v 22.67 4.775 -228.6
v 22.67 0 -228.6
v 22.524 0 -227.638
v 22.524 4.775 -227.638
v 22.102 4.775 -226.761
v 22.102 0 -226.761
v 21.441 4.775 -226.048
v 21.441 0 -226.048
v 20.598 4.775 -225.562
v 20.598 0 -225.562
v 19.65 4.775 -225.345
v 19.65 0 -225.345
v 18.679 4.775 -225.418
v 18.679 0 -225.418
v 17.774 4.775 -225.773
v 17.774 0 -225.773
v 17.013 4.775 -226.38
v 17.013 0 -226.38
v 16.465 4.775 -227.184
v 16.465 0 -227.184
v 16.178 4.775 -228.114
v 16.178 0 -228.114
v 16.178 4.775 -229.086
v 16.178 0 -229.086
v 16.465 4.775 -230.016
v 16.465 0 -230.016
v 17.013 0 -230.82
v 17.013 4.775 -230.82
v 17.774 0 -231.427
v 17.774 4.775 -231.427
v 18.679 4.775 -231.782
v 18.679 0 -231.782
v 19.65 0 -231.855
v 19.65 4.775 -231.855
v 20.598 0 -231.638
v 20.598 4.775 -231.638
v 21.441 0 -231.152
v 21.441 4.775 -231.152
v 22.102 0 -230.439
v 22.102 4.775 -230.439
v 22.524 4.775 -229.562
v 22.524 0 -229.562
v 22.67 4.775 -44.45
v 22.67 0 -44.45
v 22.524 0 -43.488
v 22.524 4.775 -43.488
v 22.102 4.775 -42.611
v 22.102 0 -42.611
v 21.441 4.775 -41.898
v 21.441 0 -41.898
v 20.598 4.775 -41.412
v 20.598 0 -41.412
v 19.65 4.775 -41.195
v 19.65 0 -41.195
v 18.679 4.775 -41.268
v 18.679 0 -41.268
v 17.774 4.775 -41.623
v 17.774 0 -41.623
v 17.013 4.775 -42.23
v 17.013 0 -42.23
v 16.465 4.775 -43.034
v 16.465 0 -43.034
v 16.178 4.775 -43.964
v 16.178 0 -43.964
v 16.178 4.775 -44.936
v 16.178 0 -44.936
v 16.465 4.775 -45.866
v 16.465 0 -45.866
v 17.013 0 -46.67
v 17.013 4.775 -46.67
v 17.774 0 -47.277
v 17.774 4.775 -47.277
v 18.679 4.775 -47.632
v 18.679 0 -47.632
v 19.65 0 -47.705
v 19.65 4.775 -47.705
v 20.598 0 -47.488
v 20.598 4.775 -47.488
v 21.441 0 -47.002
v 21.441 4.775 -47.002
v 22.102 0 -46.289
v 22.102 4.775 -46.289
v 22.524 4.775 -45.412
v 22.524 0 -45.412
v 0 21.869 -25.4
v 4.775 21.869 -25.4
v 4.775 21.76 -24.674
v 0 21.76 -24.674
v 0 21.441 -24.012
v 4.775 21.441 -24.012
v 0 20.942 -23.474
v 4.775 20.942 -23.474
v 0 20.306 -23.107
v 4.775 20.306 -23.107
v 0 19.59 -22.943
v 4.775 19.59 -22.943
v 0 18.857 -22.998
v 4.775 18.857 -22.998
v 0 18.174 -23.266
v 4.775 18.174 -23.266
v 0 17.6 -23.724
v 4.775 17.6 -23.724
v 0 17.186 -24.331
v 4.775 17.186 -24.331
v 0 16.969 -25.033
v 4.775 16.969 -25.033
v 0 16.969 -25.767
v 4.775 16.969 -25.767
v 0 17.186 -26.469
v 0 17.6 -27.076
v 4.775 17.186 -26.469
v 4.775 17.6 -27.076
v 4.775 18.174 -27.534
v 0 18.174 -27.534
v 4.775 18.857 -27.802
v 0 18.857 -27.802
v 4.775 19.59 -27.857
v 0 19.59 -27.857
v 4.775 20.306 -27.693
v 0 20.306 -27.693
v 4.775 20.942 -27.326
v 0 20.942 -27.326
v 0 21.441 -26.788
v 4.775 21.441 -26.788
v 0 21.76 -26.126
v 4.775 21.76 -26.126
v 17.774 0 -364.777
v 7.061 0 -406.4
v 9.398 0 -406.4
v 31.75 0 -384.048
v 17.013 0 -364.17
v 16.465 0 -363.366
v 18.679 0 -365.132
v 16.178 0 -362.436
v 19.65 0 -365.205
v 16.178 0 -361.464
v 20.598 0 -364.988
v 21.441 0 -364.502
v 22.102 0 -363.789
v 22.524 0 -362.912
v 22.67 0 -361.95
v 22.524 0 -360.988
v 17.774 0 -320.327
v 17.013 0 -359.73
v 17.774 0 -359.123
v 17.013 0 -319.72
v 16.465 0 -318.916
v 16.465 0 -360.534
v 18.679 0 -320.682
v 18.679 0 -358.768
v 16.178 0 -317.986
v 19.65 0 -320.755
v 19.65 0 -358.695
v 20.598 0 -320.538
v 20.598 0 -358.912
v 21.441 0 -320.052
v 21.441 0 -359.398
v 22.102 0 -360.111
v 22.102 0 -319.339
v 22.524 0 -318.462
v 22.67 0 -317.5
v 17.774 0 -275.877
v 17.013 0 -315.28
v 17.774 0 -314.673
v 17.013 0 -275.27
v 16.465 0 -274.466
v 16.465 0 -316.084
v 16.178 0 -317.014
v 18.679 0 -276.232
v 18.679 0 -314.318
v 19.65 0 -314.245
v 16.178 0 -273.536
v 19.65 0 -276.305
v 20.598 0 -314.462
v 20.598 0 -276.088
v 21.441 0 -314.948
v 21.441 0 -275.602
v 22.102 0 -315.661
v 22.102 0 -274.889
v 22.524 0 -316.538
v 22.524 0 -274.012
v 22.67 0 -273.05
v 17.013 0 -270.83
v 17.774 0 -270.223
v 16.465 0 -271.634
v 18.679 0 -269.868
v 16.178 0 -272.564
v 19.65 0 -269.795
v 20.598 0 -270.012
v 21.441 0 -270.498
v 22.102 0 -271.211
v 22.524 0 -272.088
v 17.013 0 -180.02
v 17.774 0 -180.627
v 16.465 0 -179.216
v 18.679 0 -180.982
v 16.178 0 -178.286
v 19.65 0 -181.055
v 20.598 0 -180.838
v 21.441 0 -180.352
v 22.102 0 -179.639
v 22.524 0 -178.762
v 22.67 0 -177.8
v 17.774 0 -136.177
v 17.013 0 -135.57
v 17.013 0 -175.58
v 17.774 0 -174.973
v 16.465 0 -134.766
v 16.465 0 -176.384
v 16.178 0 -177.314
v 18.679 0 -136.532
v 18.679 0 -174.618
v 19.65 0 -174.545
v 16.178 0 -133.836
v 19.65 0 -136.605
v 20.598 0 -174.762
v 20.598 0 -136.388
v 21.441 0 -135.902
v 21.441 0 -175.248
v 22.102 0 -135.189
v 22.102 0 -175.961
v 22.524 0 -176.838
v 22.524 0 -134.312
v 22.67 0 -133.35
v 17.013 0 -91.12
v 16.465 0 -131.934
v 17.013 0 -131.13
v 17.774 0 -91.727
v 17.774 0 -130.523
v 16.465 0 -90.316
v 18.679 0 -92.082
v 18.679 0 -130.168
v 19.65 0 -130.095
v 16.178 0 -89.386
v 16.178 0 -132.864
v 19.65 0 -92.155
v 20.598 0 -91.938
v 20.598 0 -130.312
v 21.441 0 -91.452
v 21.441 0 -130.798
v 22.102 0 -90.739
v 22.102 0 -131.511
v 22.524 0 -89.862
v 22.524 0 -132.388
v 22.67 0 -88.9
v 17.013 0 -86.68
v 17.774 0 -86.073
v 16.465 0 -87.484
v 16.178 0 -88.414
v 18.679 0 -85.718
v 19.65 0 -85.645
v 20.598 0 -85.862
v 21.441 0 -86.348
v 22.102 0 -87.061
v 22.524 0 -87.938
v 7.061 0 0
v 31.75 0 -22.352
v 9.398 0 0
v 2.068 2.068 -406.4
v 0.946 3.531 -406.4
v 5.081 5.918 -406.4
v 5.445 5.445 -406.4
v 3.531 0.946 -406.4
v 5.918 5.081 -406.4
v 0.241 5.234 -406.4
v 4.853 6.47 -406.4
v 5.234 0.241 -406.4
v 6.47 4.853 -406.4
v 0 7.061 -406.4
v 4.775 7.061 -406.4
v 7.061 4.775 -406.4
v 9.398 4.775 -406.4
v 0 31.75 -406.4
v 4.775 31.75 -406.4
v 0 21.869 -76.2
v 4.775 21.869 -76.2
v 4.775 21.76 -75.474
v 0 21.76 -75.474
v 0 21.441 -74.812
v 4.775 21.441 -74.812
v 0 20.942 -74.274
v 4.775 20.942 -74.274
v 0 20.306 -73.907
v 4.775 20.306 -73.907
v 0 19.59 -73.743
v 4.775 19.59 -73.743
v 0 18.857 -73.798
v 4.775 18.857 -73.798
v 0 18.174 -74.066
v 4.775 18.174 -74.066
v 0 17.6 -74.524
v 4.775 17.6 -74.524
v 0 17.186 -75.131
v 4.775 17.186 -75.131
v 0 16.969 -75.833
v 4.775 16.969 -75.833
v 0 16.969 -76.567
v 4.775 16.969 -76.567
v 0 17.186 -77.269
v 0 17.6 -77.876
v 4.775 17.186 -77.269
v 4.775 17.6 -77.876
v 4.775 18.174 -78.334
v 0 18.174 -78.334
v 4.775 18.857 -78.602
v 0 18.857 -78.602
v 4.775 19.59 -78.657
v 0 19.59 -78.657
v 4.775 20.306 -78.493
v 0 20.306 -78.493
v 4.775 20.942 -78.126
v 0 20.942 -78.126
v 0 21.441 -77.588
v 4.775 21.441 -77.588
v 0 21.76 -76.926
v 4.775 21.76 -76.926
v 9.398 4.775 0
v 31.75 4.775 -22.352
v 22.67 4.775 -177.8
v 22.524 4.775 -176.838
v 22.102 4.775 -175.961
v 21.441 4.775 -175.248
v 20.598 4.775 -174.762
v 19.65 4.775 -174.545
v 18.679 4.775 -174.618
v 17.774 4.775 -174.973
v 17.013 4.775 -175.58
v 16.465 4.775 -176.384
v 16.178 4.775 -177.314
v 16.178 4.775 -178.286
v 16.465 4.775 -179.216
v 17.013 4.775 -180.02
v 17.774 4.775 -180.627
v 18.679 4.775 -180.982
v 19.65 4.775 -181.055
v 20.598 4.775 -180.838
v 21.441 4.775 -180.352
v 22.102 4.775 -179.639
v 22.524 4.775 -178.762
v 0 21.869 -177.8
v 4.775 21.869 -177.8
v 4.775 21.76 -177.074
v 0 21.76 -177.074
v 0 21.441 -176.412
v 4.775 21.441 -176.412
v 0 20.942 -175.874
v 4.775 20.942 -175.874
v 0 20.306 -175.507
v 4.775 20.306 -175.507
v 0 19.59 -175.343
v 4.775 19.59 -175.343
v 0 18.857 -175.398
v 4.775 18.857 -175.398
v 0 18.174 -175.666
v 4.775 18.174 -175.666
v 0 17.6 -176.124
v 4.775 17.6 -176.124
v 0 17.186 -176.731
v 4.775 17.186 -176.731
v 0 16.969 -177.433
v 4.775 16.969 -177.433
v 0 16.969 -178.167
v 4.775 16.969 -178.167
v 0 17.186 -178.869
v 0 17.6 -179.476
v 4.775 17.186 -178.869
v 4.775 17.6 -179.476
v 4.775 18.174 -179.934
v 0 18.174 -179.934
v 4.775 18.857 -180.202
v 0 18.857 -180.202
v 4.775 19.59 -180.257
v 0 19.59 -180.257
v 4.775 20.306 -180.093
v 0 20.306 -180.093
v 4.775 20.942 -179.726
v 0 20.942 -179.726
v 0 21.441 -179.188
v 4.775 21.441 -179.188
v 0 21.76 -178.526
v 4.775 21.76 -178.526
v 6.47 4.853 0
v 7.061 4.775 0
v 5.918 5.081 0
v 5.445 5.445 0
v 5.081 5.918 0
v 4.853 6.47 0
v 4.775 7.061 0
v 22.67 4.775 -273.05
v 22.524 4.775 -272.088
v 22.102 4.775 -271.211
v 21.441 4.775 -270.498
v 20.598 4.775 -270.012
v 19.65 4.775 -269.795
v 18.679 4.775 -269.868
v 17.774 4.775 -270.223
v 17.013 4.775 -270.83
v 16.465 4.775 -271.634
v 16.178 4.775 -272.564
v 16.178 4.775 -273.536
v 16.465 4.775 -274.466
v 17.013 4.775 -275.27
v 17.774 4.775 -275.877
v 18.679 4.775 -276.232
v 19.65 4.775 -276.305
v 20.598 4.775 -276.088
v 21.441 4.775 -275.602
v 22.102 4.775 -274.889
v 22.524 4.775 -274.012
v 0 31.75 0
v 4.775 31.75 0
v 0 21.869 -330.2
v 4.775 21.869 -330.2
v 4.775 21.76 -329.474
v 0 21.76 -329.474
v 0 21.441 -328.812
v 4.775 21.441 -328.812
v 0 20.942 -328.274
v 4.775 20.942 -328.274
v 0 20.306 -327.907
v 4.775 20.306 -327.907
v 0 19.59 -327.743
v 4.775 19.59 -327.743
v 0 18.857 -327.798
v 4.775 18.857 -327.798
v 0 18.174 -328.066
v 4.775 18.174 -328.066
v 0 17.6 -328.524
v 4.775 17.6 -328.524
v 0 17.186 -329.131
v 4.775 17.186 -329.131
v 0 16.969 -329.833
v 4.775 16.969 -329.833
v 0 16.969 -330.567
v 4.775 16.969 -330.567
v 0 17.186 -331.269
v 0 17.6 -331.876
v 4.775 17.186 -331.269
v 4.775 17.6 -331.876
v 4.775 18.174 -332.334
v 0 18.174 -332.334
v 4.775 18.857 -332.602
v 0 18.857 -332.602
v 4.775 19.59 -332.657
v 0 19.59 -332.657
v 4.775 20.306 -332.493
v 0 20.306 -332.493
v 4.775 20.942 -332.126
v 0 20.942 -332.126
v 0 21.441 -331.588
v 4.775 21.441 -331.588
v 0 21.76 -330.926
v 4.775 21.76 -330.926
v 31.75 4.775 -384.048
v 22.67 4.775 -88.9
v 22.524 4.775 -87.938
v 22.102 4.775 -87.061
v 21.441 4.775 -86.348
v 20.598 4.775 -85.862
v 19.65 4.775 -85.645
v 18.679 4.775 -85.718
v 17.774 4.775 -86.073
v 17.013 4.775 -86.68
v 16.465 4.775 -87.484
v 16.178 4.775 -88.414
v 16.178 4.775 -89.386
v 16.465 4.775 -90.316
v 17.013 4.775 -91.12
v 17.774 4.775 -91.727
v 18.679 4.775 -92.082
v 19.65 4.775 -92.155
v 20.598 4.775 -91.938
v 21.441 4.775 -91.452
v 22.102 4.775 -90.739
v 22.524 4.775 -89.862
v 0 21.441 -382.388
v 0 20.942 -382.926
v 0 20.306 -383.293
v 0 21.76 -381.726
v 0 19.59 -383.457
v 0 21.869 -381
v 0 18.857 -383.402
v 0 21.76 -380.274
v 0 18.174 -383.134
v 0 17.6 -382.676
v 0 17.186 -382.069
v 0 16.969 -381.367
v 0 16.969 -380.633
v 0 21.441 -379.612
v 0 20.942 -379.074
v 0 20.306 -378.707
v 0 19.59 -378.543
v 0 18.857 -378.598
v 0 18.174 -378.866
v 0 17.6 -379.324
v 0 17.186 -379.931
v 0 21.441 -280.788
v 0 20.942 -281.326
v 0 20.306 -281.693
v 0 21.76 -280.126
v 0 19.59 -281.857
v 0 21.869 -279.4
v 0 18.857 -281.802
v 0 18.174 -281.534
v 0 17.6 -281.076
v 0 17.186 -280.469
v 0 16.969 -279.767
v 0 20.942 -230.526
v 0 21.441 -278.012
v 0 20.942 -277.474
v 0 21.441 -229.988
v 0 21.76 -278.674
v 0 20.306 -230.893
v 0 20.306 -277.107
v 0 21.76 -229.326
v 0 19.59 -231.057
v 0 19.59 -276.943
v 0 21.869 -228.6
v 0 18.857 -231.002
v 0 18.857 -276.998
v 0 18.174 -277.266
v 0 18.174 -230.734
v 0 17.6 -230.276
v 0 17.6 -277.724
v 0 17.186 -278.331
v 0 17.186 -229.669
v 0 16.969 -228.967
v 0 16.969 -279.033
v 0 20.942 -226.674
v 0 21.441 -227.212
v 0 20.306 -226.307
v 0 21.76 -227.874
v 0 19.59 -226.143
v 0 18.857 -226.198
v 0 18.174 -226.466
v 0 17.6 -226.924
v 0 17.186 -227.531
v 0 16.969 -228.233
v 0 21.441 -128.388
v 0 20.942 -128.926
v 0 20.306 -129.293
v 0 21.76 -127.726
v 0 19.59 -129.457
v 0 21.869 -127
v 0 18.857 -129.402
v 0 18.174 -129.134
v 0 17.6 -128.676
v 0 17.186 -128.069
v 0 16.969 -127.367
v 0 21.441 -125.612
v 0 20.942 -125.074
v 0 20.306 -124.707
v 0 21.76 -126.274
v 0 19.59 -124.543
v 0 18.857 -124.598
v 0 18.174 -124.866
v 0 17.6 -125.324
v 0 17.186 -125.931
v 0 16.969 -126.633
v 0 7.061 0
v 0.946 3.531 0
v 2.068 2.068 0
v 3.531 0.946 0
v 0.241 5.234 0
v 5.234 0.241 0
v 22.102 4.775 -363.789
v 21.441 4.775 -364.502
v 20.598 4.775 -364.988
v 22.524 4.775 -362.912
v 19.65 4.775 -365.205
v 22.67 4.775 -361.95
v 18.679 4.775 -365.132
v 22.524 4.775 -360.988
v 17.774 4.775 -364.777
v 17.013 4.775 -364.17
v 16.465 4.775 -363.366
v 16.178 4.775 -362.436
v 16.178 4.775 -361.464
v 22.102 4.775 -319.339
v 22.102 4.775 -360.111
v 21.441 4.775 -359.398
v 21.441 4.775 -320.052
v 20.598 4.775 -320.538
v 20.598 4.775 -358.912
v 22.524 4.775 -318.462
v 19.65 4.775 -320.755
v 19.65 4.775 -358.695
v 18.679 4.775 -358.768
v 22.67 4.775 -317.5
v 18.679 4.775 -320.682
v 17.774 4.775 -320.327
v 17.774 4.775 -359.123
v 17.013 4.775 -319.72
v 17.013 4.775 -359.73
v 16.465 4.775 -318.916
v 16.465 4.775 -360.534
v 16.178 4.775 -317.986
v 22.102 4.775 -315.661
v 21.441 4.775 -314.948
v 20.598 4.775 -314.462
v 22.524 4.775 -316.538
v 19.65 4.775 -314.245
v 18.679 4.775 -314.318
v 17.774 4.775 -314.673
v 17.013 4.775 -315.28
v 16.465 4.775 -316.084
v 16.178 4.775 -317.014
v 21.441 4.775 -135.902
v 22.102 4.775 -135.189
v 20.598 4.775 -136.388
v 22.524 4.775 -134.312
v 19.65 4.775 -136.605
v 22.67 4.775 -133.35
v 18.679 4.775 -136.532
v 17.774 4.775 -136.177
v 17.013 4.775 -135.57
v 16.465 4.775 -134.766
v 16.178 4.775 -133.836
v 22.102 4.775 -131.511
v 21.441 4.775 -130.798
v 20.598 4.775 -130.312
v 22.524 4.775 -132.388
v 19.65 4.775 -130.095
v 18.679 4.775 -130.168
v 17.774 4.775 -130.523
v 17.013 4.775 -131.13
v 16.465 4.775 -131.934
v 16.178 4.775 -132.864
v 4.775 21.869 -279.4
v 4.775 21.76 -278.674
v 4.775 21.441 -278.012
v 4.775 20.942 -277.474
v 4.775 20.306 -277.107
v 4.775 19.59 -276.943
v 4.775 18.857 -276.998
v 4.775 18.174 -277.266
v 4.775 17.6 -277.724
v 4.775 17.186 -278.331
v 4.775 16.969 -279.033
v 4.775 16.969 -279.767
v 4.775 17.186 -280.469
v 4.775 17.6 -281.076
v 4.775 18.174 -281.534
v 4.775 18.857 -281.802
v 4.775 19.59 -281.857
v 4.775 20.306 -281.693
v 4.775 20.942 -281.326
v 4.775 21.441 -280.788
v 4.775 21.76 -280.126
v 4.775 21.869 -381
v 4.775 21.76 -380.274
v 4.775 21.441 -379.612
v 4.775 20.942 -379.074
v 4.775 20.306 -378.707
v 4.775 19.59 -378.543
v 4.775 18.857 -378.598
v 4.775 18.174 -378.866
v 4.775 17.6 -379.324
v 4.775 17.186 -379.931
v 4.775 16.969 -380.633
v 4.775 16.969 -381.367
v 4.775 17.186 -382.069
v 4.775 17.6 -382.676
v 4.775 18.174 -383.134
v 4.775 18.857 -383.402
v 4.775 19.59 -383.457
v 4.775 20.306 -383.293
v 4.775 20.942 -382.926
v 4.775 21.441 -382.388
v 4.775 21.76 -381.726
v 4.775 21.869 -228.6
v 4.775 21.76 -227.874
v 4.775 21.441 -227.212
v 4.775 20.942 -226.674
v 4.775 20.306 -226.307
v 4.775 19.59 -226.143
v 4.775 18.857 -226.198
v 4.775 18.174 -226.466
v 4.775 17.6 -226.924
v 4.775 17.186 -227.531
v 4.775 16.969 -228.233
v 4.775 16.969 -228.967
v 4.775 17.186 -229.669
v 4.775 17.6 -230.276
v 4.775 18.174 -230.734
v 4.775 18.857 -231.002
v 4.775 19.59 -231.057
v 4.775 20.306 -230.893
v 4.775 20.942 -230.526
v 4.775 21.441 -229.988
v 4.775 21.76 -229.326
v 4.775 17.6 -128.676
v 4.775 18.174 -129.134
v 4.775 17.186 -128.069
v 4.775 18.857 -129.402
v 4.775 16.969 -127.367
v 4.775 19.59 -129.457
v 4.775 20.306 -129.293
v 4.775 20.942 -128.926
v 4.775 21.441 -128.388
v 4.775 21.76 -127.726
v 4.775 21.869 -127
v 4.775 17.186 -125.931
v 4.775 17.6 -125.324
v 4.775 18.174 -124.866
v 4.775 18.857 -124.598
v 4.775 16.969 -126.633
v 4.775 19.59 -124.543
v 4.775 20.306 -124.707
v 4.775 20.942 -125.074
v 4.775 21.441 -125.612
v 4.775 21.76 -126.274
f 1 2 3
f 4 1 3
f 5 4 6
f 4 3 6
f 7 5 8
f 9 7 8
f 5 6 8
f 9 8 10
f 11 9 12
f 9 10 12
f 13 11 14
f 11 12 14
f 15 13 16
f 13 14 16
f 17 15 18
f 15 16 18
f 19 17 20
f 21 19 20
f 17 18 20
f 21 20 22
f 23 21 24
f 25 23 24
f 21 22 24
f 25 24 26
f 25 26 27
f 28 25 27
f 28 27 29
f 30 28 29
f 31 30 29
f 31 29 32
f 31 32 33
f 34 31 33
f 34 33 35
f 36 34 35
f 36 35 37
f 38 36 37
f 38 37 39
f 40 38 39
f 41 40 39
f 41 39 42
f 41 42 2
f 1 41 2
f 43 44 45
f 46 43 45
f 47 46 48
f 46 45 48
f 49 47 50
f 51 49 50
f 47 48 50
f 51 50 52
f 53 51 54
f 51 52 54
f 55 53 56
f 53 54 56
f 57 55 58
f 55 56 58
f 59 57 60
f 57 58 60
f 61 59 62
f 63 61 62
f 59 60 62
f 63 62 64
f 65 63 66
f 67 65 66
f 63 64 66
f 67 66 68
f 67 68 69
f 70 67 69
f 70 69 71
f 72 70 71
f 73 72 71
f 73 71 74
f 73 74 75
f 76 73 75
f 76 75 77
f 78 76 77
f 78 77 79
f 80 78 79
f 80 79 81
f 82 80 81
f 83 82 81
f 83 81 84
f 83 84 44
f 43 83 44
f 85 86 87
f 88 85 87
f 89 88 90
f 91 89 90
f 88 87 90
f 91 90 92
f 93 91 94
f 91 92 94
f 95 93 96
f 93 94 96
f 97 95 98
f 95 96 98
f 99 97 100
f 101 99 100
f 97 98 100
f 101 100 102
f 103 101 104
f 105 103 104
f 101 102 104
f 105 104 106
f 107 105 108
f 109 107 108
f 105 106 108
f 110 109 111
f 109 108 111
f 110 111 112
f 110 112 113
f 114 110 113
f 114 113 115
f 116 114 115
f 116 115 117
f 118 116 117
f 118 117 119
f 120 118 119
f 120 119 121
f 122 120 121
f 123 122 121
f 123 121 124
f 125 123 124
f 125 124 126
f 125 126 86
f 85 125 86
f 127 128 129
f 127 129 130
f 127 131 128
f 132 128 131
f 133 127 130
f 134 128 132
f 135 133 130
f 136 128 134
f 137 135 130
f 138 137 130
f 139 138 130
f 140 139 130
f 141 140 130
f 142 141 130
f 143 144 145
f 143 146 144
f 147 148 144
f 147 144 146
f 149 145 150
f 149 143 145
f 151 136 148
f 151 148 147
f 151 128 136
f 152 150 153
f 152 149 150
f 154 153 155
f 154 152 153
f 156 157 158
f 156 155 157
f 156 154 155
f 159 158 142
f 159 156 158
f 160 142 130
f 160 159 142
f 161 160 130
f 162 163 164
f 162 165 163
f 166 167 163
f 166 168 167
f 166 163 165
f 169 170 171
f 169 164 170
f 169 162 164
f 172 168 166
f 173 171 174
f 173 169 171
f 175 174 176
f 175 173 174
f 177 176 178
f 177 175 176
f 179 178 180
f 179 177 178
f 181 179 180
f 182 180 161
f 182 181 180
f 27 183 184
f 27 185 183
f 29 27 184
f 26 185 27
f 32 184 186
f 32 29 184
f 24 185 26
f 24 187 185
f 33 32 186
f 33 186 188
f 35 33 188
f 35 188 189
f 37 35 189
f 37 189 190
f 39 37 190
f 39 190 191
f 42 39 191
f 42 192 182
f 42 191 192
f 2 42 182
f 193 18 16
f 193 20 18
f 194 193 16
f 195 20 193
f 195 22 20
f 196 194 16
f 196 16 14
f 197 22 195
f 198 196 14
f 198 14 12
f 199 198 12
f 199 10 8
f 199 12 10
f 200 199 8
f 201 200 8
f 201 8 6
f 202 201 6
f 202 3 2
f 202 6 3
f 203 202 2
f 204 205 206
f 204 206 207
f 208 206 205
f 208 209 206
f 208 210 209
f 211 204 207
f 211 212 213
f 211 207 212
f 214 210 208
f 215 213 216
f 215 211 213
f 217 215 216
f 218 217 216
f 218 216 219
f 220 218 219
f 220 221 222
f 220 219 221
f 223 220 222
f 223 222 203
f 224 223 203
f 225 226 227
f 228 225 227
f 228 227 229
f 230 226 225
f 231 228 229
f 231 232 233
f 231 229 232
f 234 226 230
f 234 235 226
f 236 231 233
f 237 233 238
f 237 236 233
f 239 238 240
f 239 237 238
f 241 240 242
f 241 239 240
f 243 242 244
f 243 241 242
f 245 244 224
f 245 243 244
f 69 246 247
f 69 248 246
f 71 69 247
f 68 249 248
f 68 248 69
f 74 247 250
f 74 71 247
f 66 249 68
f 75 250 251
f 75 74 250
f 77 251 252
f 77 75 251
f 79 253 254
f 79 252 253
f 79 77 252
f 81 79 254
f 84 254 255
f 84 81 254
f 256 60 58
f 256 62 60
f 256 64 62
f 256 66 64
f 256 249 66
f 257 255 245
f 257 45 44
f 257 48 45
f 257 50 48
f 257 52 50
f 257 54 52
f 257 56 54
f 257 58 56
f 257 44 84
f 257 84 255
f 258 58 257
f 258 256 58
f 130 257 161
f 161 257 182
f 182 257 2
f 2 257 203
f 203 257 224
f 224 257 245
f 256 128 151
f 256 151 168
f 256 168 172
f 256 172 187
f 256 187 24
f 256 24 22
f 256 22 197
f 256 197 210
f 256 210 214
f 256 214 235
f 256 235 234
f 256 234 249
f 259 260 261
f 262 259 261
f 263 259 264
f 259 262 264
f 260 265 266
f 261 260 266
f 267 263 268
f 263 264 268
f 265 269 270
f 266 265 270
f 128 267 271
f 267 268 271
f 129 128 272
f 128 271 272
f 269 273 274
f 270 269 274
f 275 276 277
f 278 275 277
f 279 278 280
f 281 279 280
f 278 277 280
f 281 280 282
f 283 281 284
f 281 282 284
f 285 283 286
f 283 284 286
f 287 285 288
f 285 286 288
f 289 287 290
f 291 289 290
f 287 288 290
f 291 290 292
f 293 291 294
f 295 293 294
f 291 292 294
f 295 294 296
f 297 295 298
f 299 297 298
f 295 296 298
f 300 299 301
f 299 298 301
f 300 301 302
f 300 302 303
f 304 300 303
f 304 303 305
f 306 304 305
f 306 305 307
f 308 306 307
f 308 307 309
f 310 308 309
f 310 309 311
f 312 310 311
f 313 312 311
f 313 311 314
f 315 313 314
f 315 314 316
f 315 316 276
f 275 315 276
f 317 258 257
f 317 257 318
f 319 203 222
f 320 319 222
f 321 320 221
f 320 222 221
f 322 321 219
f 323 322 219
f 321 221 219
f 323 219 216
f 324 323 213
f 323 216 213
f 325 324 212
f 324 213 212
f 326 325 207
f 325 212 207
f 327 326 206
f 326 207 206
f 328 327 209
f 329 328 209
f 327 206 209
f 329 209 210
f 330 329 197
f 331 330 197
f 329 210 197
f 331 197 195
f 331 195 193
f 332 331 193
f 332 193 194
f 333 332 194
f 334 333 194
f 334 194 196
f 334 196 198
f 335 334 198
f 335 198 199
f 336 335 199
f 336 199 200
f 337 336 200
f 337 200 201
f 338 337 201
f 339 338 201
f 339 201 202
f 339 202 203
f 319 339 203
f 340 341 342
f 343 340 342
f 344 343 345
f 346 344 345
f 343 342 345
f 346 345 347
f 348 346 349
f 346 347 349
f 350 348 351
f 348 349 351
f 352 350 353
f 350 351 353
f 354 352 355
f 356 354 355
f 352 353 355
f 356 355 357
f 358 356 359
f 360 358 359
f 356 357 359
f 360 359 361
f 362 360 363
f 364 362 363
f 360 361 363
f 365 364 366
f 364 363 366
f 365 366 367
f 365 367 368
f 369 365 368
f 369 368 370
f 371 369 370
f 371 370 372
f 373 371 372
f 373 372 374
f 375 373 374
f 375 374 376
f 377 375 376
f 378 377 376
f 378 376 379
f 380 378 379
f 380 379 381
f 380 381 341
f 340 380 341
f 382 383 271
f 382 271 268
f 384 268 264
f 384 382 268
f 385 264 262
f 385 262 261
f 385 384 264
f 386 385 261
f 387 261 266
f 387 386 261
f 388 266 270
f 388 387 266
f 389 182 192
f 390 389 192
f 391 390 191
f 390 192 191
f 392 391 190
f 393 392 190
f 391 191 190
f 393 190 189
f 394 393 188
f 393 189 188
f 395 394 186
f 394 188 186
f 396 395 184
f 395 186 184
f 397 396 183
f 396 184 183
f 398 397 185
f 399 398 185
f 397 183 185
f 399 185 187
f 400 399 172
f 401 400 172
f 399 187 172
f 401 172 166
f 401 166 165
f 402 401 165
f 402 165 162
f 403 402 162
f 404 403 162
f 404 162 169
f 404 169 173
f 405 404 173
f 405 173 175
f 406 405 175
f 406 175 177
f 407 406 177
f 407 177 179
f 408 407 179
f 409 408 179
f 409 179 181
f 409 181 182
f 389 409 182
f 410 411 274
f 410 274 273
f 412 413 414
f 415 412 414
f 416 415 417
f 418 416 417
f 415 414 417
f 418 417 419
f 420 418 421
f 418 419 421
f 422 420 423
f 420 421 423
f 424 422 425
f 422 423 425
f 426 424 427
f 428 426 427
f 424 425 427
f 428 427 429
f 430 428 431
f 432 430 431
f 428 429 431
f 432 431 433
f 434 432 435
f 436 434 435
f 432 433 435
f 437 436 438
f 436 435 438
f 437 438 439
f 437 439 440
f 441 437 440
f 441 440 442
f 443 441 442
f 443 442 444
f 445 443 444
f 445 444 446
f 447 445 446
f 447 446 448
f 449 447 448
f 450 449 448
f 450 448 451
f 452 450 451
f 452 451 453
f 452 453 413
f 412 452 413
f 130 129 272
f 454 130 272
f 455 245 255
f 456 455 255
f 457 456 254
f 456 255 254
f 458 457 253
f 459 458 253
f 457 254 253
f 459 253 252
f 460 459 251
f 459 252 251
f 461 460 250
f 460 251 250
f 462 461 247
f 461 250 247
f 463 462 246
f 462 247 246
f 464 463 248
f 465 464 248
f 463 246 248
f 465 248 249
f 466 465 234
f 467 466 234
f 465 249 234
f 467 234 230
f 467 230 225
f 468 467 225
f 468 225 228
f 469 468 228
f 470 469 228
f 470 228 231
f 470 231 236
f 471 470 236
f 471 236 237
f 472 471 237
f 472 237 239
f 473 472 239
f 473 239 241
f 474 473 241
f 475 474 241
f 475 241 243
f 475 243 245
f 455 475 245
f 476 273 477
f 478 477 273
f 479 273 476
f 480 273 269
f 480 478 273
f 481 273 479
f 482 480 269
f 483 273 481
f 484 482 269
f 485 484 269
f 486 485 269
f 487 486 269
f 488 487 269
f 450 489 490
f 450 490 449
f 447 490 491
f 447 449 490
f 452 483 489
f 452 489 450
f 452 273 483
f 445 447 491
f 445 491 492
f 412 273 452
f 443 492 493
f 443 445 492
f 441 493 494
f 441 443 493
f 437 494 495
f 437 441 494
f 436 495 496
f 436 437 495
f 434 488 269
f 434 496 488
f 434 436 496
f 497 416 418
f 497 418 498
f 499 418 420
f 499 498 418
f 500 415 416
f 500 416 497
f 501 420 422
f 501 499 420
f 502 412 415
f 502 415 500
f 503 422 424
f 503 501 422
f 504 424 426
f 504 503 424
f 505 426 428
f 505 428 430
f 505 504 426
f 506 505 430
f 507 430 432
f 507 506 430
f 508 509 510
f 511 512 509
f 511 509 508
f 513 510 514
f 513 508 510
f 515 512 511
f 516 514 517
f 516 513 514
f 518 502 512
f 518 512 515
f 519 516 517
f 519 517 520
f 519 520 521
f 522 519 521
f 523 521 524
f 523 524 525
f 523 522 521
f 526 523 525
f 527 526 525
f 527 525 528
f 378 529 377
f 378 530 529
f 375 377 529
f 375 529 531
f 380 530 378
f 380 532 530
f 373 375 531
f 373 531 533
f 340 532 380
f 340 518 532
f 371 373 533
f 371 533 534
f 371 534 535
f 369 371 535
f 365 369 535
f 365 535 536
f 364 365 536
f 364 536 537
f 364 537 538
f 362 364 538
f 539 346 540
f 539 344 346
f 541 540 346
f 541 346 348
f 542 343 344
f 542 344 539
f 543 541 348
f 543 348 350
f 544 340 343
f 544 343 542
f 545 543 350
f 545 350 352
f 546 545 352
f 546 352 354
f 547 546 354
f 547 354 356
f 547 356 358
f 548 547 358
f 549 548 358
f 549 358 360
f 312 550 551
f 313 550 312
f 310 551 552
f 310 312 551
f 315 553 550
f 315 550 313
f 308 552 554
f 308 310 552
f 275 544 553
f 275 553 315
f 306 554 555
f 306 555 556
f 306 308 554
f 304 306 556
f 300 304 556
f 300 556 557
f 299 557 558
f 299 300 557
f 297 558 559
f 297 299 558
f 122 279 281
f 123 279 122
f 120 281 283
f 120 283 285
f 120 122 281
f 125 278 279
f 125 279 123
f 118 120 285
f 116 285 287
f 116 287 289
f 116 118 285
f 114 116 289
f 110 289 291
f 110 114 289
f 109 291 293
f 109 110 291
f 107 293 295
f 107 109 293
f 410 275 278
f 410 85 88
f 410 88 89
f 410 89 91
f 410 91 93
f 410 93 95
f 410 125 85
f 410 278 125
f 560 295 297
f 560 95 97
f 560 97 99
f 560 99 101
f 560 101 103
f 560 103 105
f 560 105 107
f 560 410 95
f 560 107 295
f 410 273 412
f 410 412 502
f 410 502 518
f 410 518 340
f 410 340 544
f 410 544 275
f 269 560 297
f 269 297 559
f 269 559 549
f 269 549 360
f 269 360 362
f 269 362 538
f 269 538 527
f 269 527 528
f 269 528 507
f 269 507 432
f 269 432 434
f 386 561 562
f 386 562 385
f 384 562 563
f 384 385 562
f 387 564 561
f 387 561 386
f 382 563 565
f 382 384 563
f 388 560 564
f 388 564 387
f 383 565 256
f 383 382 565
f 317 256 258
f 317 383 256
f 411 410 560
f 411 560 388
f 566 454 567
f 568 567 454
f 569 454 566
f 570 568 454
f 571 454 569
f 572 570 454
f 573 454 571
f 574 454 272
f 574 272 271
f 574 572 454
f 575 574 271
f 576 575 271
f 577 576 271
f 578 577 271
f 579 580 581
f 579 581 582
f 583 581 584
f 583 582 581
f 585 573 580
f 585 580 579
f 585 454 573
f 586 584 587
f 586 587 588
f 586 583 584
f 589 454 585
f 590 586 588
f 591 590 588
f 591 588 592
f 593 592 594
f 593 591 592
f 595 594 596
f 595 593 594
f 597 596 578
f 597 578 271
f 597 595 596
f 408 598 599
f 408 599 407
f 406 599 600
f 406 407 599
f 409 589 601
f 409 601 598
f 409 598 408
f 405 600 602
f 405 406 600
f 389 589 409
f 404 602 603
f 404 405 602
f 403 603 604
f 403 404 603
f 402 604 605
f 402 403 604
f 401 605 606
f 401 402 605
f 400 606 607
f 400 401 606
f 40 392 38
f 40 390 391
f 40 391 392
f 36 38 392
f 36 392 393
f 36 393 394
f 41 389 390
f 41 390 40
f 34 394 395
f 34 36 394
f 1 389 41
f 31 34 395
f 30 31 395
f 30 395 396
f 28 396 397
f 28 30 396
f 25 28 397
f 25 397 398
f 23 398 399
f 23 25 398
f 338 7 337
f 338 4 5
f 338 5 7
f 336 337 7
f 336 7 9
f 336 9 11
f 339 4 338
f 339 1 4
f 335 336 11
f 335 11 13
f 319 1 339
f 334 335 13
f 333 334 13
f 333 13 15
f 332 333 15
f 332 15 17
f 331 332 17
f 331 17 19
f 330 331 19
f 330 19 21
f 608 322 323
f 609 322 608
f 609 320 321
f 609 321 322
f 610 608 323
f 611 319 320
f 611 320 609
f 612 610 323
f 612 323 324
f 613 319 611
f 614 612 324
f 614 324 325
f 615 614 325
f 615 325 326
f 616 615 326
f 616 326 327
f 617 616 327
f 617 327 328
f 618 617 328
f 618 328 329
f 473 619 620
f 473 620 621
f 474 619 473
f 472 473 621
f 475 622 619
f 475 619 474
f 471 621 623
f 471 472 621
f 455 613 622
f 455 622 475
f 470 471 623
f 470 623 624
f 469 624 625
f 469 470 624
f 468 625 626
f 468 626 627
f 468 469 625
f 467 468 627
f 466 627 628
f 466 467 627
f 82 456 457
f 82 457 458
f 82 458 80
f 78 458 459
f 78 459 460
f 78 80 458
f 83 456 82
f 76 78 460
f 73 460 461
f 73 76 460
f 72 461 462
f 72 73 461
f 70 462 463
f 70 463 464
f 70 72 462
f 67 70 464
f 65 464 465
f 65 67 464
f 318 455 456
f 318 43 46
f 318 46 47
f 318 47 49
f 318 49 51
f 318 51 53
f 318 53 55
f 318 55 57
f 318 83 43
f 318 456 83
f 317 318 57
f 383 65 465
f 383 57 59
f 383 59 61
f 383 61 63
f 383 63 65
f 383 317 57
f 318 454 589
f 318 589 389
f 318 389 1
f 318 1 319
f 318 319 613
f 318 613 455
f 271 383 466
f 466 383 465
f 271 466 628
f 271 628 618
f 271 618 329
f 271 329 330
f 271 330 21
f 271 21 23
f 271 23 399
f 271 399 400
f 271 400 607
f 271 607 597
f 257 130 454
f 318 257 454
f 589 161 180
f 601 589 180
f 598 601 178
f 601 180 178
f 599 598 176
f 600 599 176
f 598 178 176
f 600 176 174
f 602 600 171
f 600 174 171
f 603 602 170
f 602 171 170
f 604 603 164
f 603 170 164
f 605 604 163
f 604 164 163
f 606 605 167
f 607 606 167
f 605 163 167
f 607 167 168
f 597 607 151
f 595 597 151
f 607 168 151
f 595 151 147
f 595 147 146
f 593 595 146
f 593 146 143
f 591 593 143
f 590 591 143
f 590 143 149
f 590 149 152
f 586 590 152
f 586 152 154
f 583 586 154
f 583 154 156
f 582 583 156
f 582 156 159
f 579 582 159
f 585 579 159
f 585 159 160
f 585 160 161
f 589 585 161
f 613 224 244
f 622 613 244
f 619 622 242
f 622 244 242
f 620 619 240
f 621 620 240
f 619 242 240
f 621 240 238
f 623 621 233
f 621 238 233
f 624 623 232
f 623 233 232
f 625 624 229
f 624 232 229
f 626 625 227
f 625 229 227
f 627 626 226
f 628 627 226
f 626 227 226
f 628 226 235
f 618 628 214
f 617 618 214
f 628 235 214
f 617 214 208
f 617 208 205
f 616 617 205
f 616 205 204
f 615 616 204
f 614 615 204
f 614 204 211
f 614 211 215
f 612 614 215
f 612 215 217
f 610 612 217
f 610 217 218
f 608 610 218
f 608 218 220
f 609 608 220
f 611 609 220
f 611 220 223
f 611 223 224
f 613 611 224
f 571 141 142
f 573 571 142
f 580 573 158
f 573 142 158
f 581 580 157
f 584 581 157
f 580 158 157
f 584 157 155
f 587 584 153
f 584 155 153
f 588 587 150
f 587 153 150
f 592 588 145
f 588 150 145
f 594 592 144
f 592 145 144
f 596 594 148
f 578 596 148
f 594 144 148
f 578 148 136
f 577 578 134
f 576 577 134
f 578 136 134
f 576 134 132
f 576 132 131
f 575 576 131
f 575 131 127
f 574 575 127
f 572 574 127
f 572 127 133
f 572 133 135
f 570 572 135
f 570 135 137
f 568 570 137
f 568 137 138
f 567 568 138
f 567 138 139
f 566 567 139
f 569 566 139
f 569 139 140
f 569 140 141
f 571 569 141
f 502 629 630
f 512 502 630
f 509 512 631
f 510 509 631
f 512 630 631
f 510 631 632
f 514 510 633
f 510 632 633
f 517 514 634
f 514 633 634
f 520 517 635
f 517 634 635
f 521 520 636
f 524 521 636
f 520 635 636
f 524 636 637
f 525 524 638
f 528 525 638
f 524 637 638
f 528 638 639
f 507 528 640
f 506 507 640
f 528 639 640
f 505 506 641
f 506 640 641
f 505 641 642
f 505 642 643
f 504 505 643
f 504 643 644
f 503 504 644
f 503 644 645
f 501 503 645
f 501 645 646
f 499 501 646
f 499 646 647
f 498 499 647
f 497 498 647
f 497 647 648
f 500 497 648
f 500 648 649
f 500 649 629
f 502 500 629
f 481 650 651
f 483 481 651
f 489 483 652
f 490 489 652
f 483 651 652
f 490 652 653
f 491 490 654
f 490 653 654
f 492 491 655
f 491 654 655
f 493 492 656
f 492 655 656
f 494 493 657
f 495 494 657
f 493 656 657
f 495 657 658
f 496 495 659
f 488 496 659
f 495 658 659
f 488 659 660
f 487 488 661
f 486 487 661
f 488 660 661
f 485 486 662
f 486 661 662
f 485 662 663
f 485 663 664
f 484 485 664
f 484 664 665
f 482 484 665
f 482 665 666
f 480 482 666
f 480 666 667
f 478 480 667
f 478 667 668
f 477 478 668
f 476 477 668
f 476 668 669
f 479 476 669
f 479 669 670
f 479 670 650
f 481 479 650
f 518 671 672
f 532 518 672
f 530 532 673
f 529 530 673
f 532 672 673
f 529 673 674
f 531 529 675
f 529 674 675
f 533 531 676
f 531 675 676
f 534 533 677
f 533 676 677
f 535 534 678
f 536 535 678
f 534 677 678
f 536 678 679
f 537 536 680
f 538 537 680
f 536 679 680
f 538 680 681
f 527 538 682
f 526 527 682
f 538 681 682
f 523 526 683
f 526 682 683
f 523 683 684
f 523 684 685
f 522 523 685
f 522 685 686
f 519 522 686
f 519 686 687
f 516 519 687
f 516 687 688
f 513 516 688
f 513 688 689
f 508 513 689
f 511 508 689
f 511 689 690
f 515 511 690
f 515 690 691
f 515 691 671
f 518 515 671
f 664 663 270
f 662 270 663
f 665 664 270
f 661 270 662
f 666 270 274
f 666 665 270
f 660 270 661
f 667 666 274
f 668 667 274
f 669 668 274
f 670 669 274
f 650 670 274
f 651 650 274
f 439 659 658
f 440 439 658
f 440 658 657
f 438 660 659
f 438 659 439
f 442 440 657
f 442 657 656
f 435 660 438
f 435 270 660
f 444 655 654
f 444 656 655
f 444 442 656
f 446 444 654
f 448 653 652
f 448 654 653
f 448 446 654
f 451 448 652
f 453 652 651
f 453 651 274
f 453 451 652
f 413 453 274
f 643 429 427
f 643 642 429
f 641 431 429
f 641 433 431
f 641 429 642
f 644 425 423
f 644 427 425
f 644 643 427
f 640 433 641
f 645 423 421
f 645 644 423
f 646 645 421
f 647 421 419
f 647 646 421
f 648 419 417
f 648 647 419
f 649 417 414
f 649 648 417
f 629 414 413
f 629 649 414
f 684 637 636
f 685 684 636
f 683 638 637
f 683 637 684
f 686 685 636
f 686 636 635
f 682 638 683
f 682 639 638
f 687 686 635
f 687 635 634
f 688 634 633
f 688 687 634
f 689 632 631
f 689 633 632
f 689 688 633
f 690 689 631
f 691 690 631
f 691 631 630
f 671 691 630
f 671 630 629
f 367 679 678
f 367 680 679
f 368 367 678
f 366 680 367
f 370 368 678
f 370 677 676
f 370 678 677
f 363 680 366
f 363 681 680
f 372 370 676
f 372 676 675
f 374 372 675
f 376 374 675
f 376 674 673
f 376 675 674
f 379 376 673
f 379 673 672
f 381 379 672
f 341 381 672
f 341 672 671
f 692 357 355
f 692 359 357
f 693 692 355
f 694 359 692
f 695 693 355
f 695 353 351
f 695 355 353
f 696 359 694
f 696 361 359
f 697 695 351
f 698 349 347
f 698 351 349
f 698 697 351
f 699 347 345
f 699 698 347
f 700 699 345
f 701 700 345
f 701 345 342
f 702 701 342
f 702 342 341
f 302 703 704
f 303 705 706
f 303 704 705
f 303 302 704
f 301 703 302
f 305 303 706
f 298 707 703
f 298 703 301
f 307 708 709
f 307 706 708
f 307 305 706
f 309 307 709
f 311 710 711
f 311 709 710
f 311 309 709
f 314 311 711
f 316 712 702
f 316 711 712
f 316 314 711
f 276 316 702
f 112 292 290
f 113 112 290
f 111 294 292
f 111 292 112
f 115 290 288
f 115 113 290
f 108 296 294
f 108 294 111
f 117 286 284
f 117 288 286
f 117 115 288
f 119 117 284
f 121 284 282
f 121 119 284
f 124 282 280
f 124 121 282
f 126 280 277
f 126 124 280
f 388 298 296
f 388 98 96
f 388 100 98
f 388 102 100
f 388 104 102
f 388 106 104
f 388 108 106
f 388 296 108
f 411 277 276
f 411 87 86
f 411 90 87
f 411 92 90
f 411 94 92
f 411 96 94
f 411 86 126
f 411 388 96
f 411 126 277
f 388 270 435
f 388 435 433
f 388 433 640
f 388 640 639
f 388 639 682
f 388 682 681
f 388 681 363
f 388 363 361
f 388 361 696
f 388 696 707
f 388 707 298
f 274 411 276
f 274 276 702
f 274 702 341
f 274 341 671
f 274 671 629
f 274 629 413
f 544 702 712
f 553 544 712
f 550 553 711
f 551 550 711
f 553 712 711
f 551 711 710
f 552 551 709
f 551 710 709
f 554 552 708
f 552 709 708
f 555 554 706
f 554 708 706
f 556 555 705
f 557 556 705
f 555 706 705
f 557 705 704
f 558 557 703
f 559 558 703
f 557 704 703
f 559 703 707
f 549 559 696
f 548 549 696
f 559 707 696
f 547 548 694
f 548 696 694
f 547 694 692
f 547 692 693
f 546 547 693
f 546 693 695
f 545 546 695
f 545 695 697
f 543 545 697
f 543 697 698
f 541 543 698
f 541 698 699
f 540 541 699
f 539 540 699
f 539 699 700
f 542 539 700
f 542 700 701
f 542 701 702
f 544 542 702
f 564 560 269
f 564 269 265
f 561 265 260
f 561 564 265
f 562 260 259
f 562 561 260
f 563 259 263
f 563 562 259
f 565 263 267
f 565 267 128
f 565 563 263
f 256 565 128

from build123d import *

# Parameters (mm, degrees)
F1_DEPTH = 406.4
F2_SIZE  = 22.352
F3_R     = 2.4638
F4_DEPTH = 25.4
F5_R     = 3.2639
F6_DEPTH = 25.4


with BuildPart() as f1:
    # F0 (on Top) → F1 (new body)
    with BuildSketch(Plane.XY):
        with BuildLine():
            ThreePointArc((0, 7.0612), (2.068178, 2.068178), (7.0612, 0))
            Line((7.0612, 0), (31.75, 0))
            Line((31.75, 0), (31.75, 4.7752))
            Line((31.75, 4.7752), (7.0612, 4.7752))
            ThreePointArc((7.0612, 4.7752), (5.444754, 5.444754), (4.7752, 7.0612))
            Line((4.7752, 7.0612), (4.7752, 31.75))
            Line((4.7752, 31.75), (0, 31.75))
            Line((0, 31.75), (0, 7.0612))
        make_face()
    extrude(amount=-F1_DEPTH)

    # F2
    f2_edges = [f1.edges().sort_by_distance(p)[0] for p in [
        (31.75, 2.3876, 0),
        (31.75, 2.3876, -406.4),
    ]]
    chamfer(f2_edges, length=F2_SIZE)

    # F3 (on face) → F4 (cut)
    with BuildSketch(Plane.YZ.offset(4.7752)):
        with Locations((19.4056, -330.2)):
            Circle(F3_R)
        with Locations((19.4056, -76.2)):
            Circle(F3_R)
        with Locations((19.4056, -25.4)):
            Circle(F3_R)
        with Locations((19.4056, -381)):
            Circle(F3_R)
        with Locations((19.4056, -279.4)):
            Circle(F3_R)
        with Locations((19.4056, -228.6)):
            Circle(F3_R)
        with Locations((19.4056, -177.8)):
            Circle(F3_R)
        with Locations((19.4056, -127)):
            Circle(F3_R)
    extrude(amount=-F4_DEPTH, mode=Mode.SUBTRACT)

    # F5 (on face) → F6 (cut)
    with BuildSketch(Plane.XZ):
        with Locations((19.4056, -177.8)):
            Circle(F5_R)
        with Locations((19.4056, -133.35)):
            Circle(F5_R)
        with Locations((19.4056, -88.9)):
            Circle(F5_R)
        with Locations((19.4056, -44.45)):
            Circle(F5_R)
        with Locations((19.4056, -361.95)):
            Circle(F5_R)
        with Locations((19.4056, -317.5)):
            Circle(F5_R)
        with Locations((19.4056, -273.05)):
            Circle(F5_R)
        with Locations((19.4056, -228.6)):
            Circle(F5_R)
    extrude(amount=-F6_DEPTH, mode=Mode.SUBTRACT)


solid = f1.part
